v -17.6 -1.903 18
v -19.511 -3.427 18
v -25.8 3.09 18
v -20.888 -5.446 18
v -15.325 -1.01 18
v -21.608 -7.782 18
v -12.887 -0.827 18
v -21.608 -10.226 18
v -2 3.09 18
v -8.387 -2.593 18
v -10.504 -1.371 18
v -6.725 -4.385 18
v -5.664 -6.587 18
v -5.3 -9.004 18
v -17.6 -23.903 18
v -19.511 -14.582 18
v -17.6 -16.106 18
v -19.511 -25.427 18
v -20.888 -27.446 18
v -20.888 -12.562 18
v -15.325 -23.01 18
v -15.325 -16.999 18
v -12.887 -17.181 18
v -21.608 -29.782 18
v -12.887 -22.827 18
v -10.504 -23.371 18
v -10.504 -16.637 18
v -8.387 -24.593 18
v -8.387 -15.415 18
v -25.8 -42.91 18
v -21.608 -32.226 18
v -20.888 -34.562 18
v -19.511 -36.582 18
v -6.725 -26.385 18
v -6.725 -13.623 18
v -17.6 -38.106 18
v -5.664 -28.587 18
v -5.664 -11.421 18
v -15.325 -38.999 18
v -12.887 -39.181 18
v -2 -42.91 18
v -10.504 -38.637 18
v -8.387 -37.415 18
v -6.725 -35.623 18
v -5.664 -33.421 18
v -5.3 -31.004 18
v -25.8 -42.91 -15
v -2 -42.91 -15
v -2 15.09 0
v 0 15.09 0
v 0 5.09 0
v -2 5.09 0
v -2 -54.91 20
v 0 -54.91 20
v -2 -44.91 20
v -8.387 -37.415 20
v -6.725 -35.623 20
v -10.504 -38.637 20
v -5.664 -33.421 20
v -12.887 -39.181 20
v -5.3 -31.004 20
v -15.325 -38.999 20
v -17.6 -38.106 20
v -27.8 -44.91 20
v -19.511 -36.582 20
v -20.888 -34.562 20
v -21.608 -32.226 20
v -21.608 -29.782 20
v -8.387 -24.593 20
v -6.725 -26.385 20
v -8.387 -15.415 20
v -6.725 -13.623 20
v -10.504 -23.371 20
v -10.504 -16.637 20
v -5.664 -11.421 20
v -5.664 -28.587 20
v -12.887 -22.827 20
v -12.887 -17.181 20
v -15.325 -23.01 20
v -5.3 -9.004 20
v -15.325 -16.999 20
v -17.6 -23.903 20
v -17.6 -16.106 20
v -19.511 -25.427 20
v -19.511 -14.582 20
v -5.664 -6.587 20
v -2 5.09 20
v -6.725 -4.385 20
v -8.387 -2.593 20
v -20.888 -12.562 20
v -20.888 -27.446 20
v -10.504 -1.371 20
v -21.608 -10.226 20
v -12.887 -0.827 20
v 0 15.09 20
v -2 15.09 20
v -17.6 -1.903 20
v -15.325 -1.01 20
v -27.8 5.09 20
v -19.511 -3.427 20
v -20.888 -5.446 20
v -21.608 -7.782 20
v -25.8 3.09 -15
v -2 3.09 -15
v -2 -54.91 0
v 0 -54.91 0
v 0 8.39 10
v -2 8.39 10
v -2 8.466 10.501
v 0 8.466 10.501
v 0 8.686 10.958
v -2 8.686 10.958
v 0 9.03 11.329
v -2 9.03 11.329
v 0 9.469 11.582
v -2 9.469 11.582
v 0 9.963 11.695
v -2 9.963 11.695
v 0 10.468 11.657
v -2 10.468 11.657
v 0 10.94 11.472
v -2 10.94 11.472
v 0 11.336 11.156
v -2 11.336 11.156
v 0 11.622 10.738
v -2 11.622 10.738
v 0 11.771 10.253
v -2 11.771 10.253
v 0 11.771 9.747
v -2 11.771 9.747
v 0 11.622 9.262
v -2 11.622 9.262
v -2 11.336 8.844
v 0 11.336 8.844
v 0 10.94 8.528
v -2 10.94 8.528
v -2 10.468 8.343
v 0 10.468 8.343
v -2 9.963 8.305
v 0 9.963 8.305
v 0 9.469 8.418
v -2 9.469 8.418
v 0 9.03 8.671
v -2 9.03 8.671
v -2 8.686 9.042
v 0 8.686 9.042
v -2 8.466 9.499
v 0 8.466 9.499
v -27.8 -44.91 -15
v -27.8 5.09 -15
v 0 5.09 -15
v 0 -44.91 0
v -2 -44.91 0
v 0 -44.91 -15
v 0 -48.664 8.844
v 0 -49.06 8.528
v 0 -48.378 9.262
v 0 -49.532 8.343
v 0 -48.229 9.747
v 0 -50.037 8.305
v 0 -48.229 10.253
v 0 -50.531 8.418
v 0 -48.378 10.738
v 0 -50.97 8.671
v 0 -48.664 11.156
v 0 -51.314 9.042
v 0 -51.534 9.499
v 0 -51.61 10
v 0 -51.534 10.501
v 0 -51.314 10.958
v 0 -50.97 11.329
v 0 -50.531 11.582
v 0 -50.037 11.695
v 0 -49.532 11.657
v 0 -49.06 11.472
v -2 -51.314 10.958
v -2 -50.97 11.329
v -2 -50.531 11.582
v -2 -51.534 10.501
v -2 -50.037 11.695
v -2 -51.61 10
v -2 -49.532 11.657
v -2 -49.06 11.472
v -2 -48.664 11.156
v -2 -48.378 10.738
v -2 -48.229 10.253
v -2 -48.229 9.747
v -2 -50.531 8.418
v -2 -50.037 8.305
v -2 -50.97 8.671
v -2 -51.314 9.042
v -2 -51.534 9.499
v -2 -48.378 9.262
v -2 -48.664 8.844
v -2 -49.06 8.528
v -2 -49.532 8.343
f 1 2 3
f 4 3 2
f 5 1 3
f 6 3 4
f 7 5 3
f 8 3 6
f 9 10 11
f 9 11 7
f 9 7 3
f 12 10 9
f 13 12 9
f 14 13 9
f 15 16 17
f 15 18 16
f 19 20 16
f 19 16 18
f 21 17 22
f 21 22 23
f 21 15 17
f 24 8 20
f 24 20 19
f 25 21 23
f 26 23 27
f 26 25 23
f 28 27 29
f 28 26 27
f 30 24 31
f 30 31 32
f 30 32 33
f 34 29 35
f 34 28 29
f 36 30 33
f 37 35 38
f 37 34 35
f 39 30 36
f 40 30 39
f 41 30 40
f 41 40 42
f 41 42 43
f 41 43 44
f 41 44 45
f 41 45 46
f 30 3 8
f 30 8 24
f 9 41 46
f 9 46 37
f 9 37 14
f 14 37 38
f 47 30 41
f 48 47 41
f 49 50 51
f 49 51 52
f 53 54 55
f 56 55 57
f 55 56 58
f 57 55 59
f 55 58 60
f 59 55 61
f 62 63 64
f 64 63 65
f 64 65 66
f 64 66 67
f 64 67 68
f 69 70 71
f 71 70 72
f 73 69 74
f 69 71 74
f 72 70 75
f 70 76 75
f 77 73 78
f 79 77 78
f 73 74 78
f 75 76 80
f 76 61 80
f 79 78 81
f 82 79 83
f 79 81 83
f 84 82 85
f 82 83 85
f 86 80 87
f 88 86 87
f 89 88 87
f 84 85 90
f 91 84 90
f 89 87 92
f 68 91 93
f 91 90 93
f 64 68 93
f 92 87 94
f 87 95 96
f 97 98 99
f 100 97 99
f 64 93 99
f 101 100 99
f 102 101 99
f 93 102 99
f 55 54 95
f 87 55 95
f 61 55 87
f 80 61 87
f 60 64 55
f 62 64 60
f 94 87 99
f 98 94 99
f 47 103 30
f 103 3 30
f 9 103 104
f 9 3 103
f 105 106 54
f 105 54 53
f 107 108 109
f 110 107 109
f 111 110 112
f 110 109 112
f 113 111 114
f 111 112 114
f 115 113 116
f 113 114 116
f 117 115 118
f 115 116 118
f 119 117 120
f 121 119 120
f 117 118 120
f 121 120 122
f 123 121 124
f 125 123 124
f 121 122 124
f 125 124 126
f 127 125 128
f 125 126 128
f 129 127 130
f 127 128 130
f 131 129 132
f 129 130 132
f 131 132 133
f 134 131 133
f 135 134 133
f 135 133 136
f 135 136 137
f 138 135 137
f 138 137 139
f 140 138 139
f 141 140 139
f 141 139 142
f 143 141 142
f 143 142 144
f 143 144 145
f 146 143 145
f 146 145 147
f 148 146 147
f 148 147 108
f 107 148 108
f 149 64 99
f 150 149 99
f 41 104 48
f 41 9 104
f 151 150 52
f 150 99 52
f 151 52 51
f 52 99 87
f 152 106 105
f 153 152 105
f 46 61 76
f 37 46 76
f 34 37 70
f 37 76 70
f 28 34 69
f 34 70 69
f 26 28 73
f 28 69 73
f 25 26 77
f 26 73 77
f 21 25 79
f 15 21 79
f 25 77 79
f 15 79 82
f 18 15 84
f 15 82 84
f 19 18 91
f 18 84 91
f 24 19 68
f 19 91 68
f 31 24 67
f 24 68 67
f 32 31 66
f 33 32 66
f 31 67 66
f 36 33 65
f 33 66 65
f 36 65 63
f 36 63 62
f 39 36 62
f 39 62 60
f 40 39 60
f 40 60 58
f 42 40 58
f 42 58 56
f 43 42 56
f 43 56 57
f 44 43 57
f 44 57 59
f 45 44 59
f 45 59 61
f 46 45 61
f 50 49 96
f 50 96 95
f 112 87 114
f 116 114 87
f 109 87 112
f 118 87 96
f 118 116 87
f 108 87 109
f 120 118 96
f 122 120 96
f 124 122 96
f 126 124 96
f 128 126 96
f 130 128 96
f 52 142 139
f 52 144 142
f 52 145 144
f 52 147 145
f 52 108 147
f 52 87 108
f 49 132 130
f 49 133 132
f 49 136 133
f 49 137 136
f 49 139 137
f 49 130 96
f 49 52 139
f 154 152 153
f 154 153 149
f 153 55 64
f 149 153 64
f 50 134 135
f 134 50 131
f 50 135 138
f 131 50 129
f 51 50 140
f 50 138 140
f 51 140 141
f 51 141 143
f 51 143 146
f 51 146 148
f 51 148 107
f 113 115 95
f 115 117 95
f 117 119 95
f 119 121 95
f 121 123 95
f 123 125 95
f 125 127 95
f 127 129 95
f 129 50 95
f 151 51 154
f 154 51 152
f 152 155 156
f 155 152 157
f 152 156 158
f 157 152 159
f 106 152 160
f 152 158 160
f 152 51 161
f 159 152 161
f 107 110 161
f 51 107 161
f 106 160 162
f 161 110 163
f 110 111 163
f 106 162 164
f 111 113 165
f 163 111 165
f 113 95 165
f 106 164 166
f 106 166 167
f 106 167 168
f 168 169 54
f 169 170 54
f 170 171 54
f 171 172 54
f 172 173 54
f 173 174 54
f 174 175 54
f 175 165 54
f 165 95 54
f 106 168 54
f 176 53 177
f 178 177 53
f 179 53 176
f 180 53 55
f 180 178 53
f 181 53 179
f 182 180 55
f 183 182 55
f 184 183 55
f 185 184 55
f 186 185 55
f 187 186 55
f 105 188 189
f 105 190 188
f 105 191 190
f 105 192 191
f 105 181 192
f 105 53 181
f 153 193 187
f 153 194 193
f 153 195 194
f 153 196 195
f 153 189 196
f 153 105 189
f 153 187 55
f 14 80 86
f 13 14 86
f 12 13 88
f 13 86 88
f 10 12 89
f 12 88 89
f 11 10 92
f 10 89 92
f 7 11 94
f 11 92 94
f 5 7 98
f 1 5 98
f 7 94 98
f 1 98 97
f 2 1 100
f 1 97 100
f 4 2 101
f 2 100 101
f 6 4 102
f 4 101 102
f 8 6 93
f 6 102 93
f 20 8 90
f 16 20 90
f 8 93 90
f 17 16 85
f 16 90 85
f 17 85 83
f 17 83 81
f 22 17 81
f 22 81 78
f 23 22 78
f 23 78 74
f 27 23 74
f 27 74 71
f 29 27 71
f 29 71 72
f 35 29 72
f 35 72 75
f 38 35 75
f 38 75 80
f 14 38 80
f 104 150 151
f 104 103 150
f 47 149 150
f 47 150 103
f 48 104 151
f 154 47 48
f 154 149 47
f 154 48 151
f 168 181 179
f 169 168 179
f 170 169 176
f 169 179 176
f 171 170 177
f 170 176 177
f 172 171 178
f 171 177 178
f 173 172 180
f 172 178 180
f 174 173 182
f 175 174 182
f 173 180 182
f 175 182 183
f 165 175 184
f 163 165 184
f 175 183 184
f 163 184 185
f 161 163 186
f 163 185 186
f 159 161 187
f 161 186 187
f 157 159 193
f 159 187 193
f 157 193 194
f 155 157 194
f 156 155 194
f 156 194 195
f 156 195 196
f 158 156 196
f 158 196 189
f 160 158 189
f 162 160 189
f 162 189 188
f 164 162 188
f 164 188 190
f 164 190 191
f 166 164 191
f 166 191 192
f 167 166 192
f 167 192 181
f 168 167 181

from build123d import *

# Parameters (mm, degrees)
PAD_DEPTH       = 20
SKETCH001_W     = 23.8
SKETCH001_H     = 46
POCKET_DEPTH    = 18
SKETCH002_R     = 8.2
POCKET001_DEPTH = 5
SKETCH003_R     = 1.7
POCKET002_DEPTH = 5
SKETCH004_R     = 1.7
POCKET003_DEPTH = 5
SKETCH005_W     = 25.8
SKETCH005_H     = 2
SKETCH005_W_2   = 2
SKETCH005_H_2   = 48
SKETCH005_W_3   = 23.8
SKETCH005_H_3   = 50
PAD001_DEPTH    = 15
SKETCH006_W     = 23.8
SKETCH006_H     = 46
POCKET004_DEPTH = 15


with BuildPart() as part:
    # Sketch → Pad (new body)
    with BuildSketch(Plane.XY):
        Polygon((-2, 15.090214), (0, 15.090214), (0, -54.909786), (-2, -54.909786), (-2, -44.909786), (-27.8, -44.909786), (-27.8, 5.090214), (-2, 5.090214), align=None)
    extrude(amount=PAD_DEPTH)

    # Sketch001 (on Face9 of Pad) → Pocket (cut)
    with BuildSketch(Plane(origin=(0, 0, 0), x_dir=(1, 0, 0), z_dir=(0, 0, -1))):
        with Locations((-13.9, 19.909786)):
            Rectangle(SKETCH001_W, SKETCH001_H)
    extrude(amount=-POCKET_DEPTH, mode=Mode.SUBTRACT)

    # Sketch002 (on Face5 of Pocket) → Pocket001 (cut)
    with BuildSketch(Plane.XY.offset(20)):
        with Locations((-13.5, -9.004213)):
            Circle(SKETCH002_R)
        with Locations((-13.5, -31.004213)):
            Circle(SKETCH002_R)
    extrude(amount=-POCKET001_DEPTH, mode=Mode.SUBTRACT)

    # Sketch003 (on Face9 of Pocket001) → Pocket002 (cut)
    with BuildSketch(Plane(origin=(-2, 0, 0), x_dir=(0, -1, 0), z_dir=(-1, 0, 0))):
        with Locations((49.909786, 10)):
            Circle(SKETCH003_R)
    extrude(amount=-POCKET002_DEPTH, mode=Mode.SUBTRACT)

    # Sketch004 (on Face2 of Pocket002) → Pocket003 (cut)
    with BuildSketch(Plane(origin=(-2, 0, 0), x_dir=(0, -1, 0), z_dir=(-1, 0, 0))):
        with Locations((-10.090214, 10)):
            Circle(SKETCH004_R)
    extrude(amount=-POCKET003_DEPTH, mode=Mode.SUBTRACT)

    # Sketch005 (on Face4 of Pocket003) → Pad001 (join)
    with BuildSketch(Plane(origin=(0, 0, 0), x_dir=(1, 0, 0), z_dir=(0, 0, -1))):
        with Locations((-14.9, 43.909786)):
            Rectangle(SKETCH005_W, SKETCH005_H)
        with Locations((-26.8, 18.909786)):
            Rectangle(SKETCH005_W_2, SKETCH005_H_2)
        with Locations((-13.9, -4.090214)):
            Rectangle(SKETCH005_W_3, SKETCH005_H)
        with Locations((-1, 19.909786)):
            Rectangle(SKETCH005_W_2, SKETCH005_H_3)
    extrude(amount=PAD001_DEPTH)

    # Sketch006 (on Face21 of Pad001) → Pocket004 (cut)
    with BuildSketch(Plane(origin=(0, 0, -15), x_dir=(1, 0, 0), z_dir=(0, 0, -1))):
        with Locations((-13.9, 19.909786)):
            Rectangle(SKETCH006_W, SKETCH006_H)
    extrude(amount=-POCKET004_DEPTH, mode=Mode.SUBTRACT)


solid = part.part
